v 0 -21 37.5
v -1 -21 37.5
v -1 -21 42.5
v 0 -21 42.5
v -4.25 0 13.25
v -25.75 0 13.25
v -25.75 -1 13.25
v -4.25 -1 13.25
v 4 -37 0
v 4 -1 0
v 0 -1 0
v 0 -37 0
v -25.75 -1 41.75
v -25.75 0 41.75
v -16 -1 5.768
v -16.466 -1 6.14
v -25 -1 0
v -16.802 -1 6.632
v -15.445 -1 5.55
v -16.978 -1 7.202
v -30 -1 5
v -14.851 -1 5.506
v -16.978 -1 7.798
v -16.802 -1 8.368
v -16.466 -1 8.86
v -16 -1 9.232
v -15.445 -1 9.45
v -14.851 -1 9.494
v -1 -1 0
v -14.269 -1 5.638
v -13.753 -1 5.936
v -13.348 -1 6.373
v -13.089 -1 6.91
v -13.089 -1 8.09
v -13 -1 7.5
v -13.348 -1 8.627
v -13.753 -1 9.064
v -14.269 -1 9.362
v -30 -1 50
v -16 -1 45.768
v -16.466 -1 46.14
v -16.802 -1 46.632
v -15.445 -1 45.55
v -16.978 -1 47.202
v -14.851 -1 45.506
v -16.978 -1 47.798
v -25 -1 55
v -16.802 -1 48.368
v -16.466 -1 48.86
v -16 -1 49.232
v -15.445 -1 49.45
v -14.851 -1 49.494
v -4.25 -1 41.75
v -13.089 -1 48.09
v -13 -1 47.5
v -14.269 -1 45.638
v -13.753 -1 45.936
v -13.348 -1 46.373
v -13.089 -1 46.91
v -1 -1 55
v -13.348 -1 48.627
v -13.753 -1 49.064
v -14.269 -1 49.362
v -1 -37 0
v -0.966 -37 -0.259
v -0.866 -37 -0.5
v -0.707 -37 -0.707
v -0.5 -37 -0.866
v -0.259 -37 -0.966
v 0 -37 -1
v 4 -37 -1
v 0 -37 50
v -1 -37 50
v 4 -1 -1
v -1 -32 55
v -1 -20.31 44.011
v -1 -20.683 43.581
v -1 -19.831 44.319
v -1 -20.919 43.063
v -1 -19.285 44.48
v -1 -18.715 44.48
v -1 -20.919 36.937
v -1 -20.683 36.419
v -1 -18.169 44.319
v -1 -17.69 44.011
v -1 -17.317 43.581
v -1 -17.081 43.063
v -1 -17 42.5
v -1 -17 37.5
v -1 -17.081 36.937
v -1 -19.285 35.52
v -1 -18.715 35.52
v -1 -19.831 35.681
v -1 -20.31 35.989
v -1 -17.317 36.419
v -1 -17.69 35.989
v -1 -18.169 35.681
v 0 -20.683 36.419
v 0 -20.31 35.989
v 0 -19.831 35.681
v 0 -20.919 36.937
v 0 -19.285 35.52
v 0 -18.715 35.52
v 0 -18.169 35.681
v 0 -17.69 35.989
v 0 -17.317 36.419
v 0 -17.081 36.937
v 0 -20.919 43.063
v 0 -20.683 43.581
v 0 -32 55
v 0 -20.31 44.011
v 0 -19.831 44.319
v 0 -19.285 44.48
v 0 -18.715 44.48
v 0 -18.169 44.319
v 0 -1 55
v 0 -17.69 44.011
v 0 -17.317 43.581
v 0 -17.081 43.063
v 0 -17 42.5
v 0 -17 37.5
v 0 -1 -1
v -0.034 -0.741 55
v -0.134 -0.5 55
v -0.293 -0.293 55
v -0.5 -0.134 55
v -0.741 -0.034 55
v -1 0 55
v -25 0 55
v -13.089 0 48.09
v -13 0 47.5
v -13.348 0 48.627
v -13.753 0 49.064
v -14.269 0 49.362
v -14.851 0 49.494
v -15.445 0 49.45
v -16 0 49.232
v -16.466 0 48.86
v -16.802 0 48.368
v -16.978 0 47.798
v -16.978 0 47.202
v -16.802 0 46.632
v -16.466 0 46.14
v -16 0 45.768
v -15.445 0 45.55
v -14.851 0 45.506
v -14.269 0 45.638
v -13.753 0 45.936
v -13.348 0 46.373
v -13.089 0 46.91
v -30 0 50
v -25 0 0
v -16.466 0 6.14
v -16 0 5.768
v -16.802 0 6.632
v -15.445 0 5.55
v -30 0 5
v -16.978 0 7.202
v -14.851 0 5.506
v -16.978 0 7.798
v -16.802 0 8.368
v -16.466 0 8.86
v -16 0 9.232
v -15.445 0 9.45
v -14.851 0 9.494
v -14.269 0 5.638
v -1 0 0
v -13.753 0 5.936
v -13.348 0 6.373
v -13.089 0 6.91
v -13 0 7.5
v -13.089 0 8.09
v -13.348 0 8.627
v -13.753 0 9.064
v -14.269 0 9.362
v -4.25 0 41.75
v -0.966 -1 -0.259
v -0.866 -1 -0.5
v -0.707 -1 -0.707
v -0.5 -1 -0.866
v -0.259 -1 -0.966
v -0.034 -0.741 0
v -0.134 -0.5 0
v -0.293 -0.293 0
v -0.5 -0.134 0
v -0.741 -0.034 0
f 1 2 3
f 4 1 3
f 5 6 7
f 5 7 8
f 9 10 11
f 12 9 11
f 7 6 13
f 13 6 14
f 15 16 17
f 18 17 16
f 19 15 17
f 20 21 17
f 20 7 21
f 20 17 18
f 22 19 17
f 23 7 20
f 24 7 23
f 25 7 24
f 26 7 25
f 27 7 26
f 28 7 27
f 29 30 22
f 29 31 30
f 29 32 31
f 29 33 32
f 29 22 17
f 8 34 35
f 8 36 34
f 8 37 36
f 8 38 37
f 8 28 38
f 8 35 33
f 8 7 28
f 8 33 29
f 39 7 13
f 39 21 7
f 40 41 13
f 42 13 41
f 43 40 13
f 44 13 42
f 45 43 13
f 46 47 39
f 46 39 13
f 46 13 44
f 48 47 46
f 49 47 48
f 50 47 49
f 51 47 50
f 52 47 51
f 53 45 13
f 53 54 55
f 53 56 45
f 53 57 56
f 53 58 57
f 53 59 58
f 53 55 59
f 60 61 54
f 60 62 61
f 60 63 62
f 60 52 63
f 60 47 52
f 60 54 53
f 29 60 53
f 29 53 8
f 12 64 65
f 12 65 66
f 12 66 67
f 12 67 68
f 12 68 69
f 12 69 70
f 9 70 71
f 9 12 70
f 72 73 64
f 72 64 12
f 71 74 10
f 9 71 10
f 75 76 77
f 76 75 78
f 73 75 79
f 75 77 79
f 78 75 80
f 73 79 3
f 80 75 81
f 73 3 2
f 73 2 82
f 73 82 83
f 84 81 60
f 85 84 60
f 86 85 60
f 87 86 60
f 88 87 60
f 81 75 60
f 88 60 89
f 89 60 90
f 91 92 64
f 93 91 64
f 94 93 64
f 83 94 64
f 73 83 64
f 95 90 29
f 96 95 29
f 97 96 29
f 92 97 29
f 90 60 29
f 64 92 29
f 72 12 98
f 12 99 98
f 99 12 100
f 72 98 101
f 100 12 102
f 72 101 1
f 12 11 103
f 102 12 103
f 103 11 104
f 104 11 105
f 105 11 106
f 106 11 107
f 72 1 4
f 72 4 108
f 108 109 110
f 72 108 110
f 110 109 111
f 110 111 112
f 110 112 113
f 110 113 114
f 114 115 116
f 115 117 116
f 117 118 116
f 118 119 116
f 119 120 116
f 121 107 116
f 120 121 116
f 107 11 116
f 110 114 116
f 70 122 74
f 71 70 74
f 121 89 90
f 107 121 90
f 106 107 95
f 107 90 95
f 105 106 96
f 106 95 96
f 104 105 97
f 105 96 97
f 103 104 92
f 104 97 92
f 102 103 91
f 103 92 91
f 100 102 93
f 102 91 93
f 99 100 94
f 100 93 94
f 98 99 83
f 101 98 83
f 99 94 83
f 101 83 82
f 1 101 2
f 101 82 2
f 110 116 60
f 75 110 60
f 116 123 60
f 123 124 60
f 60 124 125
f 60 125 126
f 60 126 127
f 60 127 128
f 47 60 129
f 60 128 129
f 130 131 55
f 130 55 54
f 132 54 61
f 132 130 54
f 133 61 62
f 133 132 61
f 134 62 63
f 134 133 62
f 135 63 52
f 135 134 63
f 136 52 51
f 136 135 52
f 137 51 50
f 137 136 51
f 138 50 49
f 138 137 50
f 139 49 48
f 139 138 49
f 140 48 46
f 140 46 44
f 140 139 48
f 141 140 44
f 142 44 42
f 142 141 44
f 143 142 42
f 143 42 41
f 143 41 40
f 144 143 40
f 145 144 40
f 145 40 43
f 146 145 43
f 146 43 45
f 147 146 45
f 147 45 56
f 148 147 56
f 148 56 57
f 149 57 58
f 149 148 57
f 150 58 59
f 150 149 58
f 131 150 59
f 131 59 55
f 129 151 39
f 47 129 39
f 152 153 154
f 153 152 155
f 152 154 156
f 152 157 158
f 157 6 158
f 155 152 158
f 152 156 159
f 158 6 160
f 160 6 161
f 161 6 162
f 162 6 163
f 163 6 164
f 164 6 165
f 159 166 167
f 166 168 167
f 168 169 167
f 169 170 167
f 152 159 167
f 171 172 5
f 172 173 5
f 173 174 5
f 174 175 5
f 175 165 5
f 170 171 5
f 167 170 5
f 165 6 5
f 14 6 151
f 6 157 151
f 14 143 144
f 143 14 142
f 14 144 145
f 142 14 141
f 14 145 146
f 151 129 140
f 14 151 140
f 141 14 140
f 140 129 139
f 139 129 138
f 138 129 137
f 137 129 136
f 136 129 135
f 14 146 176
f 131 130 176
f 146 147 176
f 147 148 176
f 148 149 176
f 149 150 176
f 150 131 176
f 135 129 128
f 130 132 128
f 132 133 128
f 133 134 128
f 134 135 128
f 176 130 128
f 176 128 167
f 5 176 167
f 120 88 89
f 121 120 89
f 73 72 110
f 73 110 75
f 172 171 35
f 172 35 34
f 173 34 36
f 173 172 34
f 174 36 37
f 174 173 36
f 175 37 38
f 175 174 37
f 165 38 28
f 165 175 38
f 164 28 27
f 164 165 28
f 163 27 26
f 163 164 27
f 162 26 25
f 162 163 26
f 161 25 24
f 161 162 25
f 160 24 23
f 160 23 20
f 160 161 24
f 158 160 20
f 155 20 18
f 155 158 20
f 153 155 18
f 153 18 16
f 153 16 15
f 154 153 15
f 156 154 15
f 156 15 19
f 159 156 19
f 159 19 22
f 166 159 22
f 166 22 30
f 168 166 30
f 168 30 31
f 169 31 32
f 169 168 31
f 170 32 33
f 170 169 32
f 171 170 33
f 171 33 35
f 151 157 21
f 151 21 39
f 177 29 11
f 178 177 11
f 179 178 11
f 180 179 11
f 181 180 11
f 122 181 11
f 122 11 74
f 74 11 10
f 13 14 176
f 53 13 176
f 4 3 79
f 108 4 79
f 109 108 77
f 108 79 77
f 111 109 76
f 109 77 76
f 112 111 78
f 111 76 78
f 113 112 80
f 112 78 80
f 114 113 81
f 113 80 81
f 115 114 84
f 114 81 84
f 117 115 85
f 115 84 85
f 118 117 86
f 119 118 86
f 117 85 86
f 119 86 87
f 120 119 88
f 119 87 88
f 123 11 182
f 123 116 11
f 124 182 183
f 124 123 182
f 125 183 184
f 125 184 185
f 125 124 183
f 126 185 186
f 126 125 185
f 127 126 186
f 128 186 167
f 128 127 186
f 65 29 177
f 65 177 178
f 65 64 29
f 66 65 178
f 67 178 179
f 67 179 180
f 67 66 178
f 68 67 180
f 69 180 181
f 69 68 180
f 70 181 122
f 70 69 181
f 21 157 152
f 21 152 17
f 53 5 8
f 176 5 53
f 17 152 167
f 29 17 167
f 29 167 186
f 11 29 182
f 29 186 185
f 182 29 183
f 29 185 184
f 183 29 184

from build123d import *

# Parameters (mm, degrees)
F0_W     = 30
F0_H     = 55
F0_R     = 2
F0_W_2   = 21.5
F0_H_2   = 28.5
F1_DEPTH = 1
F3_DEPTH = 36
F5_DEPTH = 5.001
F6_SIZE  = 5
F7_R     = 1


with BuildPart() as f1:
    # F0 (on Front) → F1 (new body)
    with BuildSketch(Plane.XZ):
        with Locations((-15, 27.5)):
            Rectangle(F0_W, F0_H)
        with Locations((-15, 7.5)):
            Circle(F0_R, mode=Mode.SUBTRACT)
        with Locations((-15, 27.5)):
            Rectangle(F0_W_2, F0_H_2, mode=Mode.SUBTRACT)
        with Locations((-15, 47.5)):
            Circle(F0_R, mode=Mode.SUBTRACT)
    extrude(amount=F1_DEPTH)

    # F2 (on face) → F3 (join)
    with BuildSketch(Plane.XZ.offset(1)):
        Polygon((0, 0), (0, 55), (-1, 55), (-1, -1), (4, -1), (4, 0), align=None)
    extrude(amount=F3_DEPTH)

    # F4 (on face) → F5 (cut, through all)
    with BuildSketch(Plane(origin=(-1, 0, 0), x_dir=(0, -1, 0), z_dir=(-1, 0, 0))):
        with BuildLine():
            ThreePointArc((21, 42.5), (19, 44.5), (17, 42.5))
            Line((17, 42.5), (17, 37.5))
            ThreePointArc((17, 37.5), (19, 35.5), (21, 37.5))
            Line((21, 37.5), (21, 42.5))
        make_face()
    extrude(amount=-F5_DEPTH, mode=Mode.SUBTRACT)

    # F6
    f6_edges = [f1.edges().sort_by_distance(p)[0] for p in [
        (-30, -0.5, 55),
        (-0.5, -37, 55),
        (-30, -0.5, 0),
    ]]
    chamfer(f6_edges, length=F6_SIZE)

    # F7
    f7_edges = [f1.edges().sort_by_distance(p)[0] for p in [
        (0, 0, 27.5),
        (-1, -19, -1),
    ]]
    fillet(f7_edges, radius=F7_R)


solid = f1.part
